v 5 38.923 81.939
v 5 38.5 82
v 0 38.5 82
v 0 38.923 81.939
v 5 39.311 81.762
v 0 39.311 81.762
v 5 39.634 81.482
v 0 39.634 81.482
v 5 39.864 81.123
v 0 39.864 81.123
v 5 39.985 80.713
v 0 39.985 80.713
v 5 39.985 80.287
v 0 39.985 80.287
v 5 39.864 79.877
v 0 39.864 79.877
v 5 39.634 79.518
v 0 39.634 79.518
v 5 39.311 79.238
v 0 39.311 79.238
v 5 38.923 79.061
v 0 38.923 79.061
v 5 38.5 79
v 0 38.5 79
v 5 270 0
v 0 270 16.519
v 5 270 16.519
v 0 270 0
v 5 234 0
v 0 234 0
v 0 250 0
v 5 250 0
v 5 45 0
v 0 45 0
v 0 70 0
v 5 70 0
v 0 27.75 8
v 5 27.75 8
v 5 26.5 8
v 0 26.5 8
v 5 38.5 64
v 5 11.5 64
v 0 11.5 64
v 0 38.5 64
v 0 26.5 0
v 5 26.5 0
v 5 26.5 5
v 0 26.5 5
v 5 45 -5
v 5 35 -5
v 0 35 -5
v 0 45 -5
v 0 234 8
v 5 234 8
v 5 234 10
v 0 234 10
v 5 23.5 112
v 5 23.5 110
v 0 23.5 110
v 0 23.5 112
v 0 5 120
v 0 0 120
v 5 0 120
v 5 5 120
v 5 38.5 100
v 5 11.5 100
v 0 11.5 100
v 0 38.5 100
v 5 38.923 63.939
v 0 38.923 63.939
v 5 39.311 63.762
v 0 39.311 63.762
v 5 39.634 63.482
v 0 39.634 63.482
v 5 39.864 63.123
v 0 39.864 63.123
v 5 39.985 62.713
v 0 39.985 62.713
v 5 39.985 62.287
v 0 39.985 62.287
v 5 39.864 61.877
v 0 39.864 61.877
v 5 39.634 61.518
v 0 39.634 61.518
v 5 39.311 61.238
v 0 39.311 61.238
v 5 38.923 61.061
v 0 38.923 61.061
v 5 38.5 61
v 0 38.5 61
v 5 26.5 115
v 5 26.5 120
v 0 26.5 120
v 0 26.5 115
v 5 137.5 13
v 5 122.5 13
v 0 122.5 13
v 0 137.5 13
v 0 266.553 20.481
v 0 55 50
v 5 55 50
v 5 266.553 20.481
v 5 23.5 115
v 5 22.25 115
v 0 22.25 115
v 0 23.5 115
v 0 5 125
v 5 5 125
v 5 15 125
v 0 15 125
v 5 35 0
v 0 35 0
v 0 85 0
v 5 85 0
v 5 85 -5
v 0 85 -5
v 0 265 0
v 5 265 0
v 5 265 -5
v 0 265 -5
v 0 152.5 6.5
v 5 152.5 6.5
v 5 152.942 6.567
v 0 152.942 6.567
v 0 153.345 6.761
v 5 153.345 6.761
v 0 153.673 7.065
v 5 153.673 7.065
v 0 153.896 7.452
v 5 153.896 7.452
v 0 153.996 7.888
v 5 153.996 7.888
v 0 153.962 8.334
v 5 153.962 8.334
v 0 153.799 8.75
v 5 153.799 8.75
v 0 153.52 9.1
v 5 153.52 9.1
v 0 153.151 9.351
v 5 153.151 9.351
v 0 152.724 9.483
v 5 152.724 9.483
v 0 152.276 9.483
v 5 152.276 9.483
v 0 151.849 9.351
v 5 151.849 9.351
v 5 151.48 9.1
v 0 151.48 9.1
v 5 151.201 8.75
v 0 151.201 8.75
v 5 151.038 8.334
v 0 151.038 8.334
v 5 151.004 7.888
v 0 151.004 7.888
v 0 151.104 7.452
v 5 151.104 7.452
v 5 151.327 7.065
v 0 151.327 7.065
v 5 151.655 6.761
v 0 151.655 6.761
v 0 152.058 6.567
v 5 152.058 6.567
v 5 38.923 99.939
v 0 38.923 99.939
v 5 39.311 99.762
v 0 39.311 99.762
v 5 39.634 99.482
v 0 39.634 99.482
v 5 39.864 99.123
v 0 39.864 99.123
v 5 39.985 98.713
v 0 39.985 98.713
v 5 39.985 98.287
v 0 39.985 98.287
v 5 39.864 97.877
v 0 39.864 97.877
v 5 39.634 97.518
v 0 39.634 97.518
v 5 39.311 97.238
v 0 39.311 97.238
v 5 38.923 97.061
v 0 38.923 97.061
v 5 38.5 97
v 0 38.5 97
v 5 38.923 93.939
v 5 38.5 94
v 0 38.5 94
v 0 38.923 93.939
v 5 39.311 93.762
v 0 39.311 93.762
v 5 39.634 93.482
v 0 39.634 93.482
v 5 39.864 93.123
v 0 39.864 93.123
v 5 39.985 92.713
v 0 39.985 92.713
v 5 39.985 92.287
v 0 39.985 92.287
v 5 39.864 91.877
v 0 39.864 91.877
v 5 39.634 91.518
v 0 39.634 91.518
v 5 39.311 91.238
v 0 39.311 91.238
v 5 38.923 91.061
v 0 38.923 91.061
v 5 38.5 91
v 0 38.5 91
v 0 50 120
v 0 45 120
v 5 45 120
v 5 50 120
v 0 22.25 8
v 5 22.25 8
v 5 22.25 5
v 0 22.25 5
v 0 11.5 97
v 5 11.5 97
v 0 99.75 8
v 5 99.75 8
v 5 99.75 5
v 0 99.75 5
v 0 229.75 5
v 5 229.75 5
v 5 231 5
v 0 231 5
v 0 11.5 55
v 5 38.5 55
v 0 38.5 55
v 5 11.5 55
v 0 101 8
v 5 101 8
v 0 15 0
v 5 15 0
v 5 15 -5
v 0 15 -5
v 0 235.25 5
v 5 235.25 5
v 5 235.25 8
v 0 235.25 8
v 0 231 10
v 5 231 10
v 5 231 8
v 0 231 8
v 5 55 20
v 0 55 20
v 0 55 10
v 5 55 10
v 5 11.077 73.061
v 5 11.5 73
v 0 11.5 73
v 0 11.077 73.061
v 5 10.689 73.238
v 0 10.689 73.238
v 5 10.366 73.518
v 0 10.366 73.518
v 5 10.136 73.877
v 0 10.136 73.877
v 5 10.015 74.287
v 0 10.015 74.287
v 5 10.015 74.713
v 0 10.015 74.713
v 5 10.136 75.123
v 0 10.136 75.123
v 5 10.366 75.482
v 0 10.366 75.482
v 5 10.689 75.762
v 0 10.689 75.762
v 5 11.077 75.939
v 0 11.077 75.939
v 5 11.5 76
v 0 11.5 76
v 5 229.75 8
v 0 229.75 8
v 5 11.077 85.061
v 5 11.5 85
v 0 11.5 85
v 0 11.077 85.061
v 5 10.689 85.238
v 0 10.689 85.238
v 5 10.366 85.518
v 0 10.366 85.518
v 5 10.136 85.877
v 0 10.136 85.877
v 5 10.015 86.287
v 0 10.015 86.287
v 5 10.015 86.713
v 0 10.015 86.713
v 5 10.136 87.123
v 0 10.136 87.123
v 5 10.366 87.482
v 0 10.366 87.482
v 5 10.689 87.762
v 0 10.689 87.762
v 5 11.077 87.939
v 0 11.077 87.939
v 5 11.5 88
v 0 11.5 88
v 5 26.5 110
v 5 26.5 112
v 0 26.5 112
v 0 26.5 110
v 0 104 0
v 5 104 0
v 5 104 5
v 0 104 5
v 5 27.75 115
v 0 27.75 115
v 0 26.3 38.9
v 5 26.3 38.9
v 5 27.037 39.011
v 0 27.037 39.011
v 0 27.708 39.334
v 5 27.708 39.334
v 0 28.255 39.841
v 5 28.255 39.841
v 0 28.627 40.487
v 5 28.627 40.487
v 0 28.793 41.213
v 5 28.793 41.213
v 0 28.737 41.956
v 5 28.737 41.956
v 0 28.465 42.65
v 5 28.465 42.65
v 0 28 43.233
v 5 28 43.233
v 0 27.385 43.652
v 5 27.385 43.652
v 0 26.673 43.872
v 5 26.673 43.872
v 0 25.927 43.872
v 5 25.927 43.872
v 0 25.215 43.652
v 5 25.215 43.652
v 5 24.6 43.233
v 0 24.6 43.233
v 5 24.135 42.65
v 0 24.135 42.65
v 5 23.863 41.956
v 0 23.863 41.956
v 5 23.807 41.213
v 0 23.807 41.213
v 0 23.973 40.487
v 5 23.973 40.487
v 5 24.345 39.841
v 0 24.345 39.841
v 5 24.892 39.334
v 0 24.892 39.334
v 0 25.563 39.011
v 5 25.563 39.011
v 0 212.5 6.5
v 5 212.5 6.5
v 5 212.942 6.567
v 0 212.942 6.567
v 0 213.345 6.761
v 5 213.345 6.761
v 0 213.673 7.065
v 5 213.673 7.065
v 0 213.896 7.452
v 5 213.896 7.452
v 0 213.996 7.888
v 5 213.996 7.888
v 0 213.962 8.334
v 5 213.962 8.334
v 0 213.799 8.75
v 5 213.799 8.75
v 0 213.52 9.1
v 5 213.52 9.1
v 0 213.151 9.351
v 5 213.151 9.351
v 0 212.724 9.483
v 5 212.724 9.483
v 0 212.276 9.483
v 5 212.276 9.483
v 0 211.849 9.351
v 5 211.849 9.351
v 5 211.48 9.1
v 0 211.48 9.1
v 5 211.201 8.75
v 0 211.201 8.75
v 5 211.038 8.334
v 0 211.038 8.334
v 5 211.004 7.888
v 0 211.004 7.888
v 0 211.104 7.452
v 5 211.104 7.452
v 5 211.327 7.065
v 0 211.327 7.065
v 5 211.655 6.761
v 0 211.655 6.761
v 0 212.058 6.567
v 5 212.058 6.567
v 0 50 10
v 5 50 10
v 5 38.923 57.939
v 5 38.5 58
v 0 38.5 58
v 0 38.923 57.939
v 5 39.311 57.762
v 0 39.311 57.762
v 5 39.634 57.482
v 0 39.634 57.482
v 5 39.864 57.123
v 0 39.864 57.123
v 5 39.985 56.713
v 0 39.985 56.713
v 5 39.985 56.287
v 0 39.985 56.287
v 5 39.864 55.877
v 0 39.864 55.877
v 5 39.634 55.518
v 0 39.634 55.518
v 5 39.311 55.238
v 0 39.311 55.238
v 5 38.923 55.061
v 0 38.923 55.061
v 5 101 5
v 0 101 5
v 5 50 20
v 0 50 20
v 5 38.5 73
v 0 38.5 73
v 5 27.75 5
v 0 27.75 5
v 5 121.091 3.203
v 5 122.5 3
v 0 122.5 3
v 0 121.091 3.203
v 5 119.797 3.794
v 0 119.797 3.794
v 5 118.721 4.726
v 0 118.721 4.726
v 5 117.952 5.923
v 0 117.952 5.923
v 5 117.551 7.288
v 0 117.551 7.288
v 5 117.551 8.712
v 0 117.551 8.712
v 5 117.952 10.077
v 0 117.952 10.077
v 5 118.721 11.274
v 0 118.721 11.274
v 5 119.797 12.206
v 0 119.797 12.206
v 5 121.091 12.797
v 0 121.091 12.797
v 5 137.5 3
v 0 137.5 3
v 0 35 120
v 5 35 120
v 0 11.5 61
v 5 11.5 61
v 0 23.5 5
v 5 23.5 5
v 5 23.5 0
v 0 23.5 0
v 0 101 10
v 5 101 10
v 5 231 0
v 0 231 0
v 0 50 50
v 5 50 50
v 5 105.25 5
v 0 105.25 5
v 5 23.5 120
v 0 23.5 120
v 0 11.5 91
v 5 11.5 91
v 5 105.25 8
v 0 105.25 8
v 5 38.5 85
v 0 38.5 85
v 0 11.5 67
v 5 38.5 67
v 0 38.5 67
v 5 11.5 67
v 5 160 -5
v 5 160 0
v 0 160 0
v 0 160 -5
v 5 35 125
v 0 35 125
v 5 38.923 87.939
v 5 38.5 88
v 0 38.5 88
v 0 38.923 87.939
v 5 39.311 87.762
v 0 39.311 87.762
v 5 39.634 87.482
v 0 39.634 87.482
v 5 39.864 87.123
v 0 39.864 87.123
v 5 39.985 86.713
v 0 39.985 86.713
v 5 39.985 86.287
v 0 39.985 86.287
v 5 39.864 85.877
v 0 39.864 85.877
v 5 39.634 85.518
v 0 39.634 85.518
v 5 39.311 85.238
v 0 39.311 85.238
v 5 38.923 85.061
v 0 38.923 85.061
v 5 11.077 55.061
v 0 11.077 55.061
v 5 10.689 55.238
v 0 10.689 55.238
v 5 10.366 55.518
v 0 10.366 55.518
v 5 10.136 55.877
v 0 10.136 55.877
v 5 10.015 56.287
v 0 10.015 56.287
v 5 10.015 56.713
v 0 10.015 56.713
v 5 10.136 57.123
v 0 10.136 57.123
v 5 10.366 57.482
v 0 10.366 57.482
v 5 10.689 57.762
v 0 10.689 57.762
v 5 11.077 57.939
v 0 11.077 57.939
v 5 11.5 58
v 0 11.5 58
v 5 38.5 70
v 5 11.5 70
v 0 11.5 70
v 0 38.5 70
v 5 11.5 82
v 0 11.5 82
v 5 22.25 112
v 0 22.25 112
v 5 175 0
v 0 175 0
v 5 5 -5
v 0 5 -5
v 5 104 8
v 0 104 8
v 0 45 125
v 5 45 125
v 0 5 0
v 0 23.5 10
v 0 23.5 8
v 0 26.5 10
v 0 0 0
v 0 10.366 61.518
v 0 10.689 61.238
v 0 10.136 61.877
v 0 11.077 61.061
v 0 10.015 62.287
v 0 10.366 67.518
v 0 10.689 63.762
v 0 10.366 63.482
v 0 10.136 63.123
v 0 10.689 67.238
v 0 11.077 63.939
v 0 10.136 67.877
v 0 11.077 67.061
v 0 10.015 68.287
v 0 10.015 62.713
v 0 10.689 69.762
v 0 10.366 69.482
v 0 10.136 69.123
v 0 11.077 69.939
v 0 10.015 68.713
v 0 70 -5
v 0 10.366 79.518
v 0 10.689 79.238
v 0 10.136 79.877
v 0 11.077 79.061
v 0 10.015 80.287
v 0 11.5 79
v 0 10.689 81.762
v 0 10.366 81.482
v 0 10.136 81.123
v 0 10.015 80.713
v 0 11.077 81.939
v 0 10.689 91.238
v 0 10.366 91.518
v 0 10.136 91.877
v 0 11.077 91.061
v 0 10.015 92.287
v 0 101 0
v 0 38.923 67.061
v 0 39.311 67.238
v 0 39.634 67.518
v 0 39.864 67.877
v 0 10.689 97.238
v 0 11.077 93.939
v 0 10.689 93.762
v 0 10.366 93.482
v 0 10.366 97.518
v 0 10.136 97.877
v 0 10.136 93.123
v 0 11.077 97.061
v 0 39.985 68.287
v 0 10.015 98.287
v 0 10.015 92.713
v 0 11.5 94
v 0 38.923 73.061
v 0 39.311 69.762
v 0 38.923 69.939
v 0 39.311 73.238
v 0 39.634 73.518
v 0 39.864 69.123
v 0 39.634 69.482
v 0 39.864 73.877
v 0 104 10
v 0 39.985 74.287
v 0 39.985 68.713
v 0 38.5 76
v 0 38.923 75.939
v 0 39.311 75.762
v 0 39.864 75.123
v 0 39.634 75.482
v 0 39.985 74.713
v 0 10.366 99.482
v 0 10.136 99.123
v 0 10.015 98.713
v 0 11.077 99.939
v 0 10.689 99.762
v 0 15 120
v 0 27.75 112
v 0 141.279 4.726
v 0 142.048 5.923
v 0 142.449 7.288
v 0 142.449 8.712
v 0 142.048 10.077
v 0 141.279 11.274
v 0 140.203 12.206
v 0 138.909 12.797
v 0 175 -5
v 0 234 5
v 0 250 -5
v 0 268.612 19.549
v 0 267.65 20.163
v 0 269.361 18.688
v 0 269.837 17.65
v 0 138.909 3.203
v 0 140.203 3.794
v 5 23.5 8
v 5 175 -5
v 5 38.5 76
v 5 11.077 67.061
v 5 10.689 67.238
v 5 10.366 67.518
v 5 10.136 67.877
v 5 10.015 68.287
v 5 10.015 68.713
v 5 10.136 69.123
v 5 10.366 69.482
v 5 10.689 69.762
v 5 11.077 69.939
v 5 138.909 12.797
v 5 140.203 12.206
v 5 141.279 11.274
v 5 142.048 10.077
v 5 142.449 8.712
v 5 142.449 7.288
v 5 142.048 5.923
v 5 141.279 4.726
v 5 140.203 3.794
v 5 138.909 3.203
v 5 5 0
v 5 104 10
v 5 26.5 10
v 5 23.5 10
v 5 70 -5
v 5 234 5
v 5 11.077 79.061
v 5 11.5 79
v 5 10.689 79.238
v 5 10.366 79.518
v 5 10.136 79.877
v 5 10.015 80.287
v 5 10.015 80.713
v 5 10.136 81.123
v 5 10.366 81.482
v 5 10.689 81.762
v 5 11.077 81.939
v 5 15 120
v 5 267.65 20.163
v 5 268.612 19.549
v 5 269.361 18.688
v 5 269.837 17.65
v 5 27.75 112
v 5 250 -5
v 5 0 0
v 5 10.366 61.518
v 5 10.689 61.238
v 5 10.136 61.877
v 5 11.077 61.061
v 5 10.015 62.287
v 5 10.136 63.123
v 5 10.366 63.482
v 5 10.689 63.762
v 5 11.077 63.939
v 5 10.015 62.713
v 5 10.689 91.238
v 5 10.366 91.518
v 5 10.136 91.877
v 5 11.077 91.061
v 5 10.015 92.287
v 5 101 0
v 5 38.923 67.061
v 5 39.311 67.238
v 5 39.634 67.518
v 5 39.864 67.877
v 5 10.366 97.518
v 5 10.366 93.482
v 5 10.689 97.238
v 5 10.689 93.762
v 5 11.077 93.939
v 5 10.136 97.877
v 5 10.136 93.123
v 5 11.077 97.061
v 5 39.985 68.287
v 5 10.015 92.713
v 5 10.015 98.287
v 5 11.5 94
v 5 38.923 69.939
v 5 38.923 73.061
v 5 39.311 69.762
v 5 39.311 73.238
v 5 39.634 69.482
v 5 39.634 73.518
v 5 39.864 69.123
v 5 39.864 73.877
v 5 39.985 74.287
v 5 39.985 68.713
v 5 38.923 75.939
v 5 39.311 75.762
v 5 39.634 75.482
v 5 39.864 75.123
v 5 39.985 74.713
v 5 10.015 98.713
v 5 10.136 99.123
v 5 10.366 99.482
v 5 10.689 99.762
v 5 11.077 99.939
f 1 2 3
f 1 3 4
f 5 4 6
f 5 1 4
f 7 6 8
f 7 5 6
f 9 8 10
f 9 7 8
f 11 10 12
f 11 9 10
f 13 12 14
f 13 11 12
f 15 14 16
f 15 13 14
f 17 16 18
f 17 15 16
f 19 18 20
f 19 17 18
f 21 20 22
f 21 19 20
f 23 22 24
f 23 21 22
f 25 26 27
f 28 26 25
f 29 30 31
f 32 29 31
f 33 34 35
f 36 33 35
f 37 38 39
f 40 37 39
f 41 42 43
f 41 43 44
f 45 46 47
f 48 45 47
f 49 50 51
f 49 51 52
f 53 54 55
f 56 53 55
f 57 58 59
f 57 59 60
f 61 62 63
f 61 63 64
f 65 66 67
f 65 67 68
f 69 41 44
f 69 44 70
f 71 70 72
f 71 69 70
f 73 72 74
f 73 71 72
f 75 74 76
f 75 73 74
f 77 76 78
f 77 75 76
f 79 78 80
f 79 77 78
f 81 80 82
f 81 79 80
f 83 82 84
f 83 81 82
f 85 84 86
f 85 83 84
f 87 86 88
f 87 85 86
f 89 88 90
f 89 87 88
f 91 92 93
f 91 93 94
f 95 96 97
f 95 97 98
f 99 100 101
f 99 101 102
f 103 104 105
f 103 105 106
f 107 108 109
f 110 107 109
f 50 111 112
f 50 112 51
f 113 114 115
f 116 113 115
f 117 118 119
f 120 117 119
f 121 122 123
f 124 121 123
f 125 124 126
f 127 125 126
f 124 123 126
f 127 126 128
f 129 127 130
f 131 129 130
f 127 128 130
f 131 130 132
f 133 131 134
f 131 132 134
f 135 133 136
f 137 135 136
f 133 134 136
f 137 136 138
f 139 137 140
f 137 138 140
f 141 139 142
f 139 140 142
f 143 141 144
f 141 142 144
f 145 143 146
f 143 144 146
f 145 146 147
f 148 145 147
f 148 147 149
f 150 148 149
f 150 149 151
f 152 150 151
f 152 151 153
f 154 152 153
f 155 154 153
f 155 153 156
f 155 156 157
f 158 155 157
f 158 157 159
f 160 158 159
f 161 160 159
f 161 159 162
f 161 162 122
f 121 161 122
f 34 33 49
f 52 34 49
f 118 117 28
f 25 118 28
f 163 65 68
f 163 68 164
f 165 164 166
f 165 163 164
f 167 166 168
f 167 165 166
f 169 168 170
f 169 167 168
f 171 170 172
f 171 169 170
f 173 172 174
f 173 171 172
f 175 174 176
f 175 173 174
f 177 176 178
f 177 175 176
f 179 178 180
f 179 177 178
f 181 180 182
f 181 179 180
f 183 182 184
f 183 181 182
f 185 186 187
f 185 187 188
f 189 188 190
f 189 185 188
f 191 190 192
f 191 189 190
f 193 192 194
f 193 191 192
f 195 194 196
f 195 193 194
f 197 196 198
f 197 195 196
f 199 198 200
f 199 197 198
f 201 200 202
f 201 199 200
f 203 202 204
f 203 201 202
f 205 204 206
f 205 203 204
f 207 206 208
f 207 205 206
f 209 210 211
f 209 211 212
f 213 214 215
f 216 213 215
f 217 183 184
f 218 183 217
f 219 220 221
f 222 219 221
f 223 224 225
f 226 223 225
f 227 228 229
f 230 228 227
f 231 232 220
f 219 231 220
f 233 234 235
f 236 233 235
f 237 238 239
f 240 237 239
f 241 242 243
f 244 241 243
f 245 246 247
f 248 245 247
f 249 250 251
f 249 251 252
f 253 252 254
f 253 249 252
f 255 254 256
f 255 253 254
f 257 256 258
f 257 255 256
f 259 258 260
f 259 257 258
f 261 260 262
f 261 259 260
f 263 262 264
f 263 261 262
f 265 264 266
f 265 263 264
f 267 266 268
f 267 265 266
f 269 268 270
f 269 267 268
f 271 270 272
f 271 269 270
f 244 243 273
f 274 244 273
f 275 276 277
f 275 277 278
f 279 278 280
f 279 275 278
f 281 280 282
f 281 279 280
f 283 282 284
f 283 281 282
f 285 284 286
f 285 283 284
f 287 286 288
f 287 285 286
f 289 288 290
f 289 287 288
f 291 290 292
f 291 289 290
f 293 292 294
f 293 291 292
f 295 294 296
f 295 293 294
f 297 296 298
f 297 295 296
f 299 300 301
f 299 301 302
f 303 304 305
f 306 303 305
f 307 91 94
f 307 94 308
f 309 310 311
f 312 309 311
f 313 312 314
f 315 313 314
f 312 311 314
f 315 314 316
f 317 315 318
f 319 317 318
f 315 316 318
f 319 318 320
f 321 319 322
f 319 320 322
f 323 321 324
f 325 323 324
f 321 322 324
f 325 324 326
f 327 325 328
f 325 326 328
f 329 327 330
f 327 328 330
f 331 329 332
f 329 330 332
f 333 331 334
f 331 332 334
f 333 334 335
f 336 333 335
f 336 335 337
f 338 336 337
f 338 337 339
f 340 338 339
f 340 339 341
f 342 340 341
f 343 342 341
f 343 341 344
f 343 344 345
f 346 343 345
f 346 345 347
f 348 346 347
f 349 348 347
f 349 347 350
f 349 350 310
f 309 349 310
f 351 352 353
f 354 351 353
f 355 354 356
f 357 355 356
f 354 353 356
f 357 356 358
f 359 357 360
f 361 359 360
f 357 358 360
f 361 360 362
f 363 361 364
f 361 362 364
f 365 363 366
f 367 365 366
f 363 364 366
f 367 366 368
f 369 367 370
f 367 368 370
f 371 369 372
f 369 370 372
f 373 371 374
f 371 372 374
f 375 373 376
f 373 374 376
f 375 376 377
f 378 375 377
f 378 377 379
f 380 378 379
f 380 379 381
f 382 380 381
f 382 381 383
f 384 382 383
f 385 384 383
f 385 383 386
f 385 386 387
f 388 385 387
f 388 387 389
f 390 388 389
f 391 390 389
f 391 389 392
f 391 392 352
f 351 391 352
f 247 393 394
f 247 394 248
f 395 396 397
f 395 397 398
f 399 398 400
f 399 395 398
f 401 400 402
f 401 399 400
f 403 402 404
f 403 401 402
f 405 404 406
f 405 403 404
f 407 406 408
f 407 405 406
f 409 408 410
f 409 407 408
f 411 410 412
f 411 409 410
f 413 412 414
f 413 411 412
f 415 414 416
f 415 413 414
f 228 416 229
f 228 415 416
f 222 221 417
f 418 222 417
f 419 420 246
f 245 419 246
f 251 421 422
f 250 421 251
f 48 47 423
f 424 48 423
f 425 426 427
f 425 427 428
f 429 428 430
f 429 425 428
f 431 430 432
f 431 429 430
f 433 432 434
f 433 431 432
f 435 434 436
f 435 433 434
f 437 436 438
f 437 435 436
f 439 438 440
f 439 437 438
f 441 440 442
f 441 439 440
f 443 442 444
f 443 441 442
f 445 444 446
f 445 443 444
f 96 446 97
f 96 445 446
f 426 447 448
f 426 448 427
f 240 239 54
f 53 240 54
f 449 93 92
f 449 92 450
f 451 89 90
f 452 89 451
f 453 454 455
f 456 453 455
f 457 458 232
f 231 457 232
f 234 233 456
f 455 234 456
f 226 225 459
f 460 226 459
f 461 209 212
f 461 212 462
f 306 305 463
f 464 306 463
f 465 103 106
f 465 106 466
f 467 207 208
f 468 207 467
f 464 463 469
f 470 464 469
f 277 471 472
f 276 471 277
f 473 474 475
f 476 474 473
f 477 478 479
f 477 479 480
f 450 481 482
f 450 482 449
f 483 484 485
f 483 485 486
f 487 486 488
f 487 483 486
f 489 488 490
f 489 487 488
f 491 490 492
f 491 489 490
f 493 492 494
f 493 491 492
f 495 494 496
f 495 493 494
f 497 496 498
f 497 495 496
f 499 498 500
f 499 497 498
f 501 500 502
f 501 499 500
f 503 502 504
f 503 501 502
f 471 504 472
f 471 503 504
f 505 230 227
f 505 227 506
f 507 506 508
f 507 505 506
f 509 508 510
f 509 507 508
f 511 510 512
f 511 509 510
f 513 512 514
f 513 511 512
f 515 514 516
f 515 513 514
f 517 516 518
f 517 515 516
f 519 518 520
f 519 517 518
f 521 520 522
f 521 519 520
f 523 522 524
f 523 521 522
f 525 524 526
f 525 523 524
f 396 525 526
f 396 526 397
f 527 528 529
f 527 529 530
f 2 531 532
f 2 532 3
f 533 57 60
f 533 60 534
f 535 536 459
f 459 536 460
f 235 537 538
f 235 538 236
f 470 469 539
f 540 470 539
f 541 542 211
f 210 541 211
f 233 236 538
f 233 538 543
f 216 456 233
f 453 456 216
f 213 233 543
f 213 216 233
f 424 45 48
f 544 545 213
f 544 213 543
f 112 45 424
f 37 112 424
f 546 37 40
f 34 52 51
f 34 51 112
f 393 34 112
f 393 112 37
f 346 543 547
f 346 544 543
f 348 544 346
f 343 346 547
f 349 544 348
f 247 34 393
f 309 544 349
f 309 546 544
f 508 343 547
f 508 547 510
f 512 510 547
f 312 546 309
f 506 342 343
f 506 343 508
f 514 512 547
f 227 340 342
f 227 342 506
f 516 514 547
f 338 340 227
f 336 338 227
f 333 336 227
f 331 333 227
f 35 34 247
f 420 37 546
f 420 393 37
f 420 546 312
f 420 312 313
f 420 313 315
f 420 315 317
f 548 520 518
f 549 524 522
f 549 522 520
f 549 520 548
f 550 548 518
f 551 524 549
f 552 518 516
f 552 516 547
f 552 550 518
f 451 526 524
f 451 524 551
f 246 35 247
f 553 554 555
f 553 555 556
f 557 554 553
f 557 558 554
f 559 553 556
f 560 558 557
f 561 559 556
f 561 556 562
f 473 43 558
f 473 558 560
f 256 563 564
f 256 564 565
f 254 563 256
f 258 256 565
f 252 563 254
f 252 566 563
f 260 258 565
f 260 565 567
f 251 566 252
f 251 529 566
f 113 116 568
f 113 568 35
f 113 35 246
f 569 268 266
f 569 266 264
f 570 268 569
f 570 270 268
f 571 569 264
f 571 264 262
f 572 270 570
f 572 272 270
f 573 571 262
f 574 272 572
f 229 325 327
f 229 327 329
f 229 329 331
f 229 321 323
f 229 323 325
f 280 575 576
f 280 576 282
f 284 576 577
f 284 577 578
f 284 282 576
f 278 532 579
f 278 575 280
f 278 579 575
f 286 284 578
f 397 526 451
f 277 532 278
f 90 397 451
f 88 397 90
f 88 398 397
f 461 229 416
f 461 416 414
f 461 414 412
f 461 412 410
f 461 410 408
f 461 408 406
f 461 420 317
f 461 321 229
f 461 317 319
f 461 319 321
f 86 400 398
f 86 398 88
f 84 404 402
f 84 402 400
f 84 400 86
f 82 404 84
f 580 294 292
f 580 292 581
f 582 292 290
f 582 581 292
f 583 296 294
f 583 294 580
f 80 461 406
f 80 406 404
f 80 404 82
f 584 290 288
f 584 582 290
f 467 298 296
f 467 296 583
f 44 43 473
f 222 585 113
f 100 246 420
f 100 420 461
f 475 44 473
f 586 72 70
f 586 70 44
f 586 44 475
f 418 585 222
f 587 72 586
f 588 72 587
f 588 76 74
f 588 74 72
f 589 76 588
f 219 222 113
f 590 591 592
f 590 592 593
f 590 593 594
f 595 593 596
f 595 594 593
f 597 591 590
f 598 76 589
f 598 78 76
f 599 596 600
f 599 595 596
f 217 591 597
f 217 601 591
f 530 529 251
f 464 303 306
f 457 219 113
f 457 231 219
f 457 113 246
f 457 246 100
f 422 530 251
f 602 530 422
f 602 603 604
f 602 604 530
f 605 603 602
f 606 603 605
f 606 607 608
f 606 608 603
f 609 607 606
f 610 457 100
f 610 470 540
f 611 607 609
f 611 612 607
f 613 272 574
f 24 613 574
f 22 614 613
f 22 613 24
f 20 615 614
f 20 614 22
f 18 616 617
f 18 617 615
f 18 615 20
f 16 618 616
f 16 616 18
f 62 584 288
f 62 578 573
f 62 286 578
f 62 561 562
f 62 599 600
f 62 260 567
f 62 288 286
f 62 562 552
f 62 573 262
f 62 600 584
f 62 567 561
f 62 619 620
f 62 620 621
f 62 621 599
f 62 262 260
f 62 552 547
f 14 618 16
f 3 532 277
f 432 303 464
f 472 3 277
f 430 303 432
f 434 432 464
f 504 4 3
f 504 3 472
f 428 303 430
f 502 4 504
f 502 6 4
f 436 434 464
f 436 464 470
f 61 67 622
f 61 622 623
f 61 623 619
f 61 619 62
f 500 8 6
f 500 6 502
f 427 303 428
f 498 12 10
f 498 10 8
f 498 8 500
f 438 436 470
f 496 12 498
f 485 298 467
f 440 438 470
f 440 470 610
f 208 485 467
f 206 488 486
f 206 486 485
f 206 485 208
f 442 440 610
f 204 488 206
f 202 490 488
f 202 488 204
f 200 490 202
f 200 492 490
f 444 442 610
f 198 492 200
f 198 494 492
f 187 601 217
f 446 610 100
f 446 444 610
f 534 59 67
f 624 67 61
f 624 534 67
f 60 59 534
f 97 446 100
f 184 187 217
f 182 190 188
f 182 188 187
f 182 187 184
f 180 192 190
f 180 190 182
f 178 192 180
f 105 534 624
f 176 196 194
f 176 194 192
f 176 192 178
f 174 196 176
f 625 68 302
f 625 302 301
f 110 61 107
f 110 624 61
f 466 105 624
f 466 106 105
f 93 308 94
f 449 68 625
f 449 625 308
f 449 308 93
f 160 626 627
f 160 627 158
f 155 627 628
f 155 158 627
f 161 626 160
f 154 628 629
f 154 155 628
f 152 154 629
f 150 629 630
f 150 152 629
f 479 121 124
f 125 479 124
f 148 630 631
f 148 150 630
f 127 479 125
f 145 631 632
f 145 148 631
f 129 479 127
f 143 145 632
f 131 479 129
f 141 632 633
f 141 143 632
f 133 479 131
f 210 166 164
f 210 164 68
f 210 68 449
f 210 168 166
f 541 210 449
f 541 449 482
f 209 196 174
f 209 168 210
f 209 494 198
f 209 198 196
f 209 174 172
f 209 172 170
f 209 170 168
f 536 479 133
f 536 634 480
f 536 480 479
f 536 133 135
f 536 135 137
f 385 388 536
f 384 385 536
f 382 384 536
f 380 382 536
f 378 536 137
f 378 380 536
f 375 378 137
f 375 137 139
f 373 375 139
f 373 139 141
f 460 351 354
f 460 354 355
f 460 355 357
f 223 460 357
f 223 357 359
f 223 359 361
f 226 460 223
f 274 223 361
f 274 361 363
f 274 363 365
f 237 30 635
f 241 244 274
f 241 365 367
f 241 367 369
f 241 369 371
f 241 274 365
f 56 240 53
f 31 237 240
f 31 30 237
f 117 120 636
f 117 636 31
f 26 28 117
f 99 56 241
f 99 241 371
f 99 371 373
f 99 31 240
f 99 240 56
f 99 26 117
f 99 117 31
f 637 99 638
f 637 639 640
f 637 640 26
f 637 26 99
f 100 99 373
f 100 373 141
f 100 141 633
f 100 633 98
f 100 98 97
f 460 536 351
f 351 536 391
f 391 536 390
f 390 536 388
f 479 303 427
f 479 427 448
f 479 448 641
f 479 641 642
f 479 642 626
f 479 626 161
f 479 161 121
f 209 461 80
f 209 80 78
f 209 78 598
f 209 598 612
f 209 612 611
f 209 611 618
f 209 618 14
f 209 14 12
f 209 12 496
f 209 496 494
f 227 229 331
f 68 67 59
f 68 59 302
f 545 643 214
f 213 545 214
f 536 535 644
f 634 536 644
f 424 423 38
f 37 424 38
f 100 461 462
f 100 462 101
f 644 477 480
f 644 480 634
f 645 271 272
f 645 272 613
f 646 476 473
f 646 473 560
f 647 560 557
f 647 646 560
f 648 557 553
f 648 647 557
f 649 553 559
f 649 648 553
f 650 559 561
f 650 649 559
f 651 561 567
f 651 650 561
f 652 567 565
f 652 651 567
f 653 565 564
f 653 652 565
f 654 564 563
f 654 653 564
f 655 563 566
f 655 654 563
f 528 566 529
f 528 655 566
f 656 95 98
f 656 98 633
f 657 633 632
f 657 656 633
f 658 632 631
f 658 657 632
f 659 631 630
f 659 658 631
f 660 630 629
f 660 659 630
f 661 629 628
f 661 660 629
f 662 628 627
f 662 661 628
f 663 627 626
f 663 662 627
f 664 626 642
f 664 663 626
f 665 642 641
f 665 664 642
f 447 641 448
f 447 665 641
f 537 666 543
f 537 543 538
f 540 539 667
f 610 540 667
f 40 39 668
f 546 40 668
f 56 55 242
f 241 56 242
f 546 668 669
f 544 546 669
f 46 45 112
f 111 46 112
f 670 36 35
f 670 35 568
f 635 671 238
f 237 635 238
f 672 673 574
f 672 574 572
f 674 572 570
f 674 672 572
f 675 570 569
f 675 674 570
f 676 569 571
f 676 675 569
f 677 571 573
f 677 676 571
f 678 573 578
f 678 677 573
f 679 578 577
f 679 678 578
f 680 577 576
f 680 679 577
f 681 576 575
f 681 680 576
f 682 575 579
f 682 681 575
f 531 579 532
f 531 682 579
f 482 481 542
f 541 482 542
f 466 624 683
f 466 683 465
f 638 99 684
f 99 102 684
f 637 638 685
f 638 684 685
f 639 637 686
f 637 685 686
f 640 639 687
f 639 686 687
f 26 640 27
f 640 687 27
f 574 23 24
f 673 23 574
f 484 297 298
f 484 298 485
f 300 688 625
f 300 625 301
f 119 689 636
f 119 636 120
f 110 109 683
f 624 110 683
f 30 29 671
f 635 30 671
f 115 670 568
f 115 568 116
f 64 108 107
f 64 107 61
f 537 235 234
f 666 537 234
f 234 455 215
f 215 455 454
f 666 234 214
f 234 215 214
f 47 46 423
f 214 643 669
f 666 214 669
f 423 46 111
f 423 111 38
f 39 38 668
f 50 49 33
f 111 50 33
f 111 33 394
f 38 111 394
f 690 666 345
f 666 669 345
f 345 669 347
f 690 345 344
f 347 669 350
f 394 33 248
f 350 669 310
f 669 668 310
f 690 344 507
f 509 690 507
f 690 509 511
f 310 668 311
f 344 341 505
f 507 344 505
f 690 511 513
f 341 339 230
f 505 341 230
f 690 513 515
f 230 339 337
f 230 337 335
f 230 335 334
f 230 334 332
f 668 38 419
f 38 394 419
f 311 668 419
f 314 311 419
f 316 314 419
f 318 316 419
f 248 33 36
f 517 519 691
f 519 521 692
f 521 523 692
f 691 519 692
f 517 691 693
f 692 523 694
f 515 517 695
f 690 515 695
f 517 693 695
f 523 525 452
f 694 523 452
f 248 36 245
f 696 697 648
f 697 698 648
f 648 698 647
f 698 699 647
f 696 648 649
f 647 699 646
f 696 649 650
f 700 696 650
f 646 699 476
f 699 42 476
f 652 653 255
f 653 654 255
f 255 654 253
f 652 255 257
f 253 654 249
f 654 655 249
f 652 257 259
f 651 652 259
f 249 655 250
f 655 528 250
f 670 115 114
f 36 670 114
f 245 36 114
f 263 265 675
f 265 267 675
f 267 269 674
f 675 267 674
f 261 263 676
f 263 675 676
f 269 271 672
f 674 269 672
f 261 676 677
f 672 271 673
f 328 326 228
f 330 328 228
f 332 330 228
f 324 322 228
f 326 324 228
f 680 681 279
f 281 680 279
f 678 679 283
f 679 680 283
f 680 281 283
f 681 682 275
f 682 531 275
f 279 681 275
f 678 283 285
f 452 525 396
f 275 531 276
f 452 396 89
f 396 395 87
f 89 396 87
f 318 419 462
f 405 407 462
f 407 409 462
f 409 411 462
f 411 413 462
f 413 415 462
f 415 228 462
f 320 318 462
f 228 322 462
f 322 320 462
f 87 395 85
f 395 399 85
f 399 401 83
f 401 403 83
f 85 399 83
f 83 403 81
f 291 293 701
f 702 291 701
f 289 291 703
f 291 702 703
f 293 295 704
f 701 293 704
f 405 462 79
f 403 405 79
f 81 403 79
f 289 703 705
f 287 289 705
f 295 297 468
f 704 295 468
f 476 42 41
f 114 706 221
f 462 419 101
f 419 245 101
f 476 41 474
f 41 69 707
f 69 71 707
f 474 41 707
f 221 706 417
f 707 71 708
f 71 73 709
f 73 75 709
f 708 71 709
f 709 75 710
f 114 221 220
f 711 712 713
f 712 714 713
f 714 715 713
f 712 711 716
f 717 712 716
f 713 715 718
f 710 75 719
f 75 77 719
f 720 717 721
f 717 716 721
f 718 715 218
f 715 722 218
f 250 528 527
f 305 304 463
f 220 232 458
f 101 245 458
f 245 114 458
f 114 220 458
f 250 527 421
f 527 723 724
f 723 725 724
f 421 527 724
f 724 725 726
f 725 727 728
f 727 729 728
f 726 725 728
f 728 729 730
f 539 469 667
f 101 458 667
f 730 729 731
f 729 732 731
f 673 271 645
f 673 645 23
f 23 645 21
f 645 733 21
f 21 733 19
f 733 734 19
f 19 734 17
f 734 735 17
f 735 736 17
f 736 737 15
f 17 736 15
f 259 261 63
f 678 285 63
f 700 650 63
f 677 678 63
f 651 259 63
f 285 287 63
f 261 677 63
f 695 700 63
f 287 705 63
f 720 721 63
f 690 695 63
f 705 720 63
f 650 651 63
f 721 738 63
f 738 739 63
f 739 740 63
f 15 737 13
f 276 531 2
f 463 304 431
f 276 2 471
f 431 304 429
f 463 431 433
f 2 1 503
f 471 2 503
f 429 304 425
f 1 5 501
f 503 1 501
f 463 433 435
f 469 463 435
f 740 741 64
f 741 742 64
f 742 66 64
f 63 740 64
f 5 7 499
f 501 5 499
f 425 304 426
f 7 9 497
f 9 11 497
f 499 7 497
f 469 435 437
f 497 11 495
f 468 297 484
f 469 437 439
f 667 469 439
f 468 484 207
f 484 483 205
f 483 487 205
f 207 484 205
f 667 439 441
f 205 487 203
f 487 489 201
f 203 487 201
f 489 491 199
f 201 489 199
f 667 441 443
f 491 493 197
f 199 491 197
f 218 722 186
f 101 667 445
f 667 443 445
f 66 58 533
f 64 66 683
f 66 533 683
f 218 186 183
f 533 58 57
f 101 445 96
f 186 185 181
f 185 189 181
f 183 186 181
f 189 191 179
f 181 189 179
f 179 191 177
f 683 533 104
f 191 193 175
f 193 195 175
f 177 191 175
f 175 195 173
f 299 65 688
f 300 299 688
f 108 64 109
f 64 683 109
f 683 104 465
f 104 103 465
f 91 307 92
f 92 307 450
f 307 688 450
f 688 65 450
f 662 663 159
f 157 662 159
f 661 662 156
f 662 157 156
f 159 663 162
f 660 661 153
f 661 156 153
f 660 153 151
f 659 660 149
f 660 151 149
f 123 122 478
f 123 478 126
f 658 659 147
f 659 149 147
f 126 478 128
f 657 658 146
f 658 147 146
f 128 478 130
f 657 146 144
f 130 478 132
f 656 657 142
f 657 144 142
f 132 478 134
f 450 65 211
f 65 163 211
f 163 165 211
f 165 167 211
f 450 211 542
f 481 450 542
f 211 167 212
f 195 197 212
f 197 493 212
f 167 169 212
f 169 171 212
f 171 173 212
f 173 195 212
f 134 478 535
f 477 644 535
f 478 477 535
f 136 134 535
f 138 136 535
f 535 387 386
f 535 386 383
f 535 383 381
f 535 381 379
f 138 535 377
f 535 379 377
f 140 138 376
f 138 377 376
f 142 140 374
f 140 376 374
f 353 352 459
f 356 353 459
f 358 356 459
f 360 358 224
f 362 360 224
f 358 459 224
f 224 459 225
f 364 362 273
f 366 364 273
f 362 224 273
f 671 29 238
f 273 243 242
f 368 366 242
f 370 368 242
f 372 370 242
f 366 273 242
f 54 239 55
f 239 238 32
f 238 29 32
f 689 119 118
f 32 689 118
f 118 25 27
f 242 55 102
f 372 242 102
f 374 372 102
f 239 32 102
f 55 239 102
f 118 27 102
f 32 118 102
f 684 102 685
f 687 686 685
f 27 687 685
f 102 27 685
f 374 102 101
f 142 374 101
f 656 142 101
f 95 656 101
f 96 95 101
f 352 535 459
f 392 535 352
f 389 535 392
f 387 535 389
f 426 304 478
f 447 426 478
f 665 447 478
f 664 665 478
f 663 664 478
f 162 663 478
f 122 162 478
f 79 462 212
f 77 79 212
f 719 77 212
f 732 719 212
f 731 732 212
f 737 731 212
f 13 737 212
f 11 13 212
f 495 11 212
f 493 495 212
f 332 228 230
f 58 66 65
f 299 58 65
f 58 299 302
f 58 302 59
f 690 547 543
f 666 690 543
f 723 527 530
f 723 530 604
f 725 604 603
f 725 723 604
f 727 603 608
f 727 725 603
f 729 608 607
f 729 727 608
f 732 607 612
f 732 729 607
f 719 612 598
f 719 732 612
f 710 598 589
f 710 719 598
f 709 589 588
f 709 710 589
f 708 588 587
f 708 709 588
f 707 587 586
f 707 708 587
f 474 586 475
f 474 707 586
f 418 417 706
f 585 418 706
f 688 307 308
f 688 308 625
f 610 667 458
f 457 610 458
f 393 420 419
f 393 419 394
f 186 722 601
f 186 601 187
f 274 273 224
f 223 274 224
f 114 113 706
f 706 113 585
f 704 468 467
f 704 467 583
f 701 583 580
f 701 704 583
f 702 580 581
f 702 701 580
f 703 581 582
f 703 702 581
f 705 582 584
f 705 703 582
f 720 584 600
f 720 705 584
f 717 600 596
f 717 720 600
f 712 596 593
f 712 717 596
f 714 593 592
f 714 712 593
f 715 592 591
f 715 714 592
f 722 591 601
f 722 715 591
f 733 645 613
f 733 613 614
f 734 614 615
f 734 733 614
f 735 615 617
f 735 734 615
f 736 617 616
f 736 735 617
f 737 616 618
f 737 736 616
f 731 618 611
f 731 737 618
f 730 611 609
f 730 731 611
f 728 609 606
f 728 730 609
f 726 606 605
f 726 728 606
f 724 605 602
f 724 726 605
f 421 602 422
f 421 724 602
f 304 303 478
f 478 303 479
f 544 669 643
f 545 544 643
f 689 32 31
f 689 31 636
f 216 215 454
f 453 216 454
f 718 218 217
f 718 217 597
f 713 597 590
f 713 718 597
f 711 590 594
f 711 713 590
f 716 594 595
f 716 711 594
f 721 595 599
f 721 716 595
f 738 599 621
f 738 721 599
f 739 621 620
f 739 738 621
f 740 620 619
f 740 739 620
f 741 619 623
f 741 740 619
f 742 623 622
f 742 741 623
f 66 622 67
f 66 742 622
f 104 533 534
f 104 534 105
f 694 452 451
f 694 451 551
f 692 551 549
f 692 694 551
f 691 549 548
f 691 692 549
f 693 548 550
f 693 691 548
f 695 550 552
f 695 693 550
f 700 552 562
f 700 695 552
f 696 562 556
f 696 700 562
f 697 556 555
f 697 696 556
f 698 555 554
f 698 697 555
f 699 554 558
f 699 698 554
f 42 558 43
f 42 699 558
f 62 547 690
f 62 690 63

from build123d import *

# Parameters (mm, degrees)
SKETCH1_W           = 10
SKETCH1_H           = 5
BOSS_EXTRUDE1_DEPTH = 5
SKETCH2_W           = 5
SKETCH2_H           = 10
SKETCH2_H_2         = 15
BOSS_EXTRUDE2_DEPTH = 5
SKETCH3_R           = 2.5
SKETCH3_R_2         = 1.5
CUT_EXTRUDE1_DEPTH  = 298.573520327
CUT_EXTRUDE2_DEPTH  = 298.573520327
FILLET1_R           = 4


with BuildPart() as part:
    # Sketch1 → Boss-Extrude1 (new body)
    with BuildSketch(Plane(origin=(0, 0, 0), x_dir=(0, 0, -1), z_dir=(1, 0, 0))):
        Polygon((-50, 50), (-50, 55), (-20, 270), (0, 270), (0, 55), (0, 50), (0, 0), (-120, 0), (-120, 50), align=None)
        with Locations((-15, 52.5)):
            Rectangle(SKETCH1_W, SKETCH1_H, mode=Mode.SUBTRACT)
    extrude(amount=BOSS_EXTRUDE1_DEPTH)

    # Sketch2 → Boss-Extrude2 (add)
    with BuildSketch(Plane(origin=(5, 0, 0), x_dir=(0, 0, -1), z_dir=(1, 0, 0))):
        with Locations((-122.5, 10)):
            Rectangle(SKETCH2_W, SKETCH2_H)
        with Locations((-122.5, 40)):
            Rectangle(SKETCH2_W, SKETCH2_H)
        with Locations((2.5, 257.5)):
            Rectangle(SKETCH2_W, SKETCH2_H_2)
        with Locations((2.5, 77.5)):
            Rectangle(SKETCH2_W, SKETCH2_H_2)
        with Locations((2.5, 40)):
            Rectangle(SKETCH2_W, SKETCH2_H)
        with Locations((2.5, 10)):
            Rectangle(SKETCH2_W, SKETCH2_H)
        with Locations((2.5, 167.5)):
            Rectangle(SKETCH2_W, SKETCH2_H_2)
    extrude(amount=-BOSS_EXTRUDE2_DEPTH)

    # Sketch3 → Cut-Extrude1 (cut, through all)
    with BuildSketch(Plane(origin=(5, 0, 0), x_dir=(0, 0, -1), z_dir=(1, 0, 0))):
        with Locations((-41.4, 26.3)):
            Circle(SKETCH3_R)
        with Locations((-8, 212.5)):
            Circle(SKETCH3_R_2)
        with Locations((-8, 152.5)):
            Circle(SKETCH3_R_2)
        Polygon((0, 26.5), (-5, 26.5), (-5, 27.75), (-8, 27.75), (-8, 26.5), (-10, 26.5), (-10, 23.5), (-8, 23.5), (-8, 22.25), (-5, 22.25), (-5, 23.5), (0, 23.5), align=None)
        Polygon((0, 104), (-5, 104), (-5, 105.25), (-8, 105.25), (-8, 104), (-10, 104), (-10, 101), (-8, 101), (-8, 99.75), (-5, 99.75), (-5, 101), (0, 101), align=None)
        Polygon((0, 234), (-5, 234), (-5, 235.25), (-8, 235.25), (-8, 234), (-10, 234), (-10, 231), (-8, 231), (-8, 229.75), (-5, 229.75), (-5, 231), (0, 231), align=None)
        Polygon((-120, 23.5), (-120, 26.5), (-115, 26.5), (-115, 27.75), (-112, 27.75), (-112, 26.5), (-110, 26.5), (-110, 23.5), (-112, 23.5), (-112, 22.25), (-115, 22.25), (-115, 23.5), align=None)
        with BuildLine():
            Line((-3, 137.5), (-3, 122.5))
            ThreePointArc((-3, 122.5), (-8, 117.5), (-13, 122.5))
            Line((-13, 122.5), (-13, 137.5))
            ThreePointArc((-13, 137.5), (-8, 142.5), (-3, 137.5))
        make_face()
    extrude(amount=-CUT_EXTRUDE1_DEPTH, mode=Mode.SUBTRACT)

    # Sketch4 → Cut-Extrude2 (cut, through all)
    with BuildSketch(Plane(origin=(5, 0, 0), x_dir=(0, 0, -1), z_dir=(1, 0, 0))):
        with BuildLine():
            Line((-97, 38.5), (-97, 11.5))
            ThreePointArc((-97, 11.5), (-98.5, 10), (-100, 11.5))
            Line((-100, 11.5), (-100, 38.5))
            ThreePointArc((-100, 38.5), (-98.5, 40), (-97, 38.5))
        make_face()
        with BuildLine():
            Line((-91, 38.5), (-91, 11.5))
            ThreePointArc((-91, 11.5), (-92.5, 10), (-94, 11.5))
            Line((-94, 11.5), (-94, 38.5))
            ThreePointArc((-94, 38.5), (-92.5, 40), (-91, 38.5))
        make_face()
        with BuildLine():
            Line((-85, 38.5), (-85, 11.5))
            ThreePointArc((-85, 11.5), (-86.5, 10), (-88, 11.5))
            Line((-88, 11.5), (-88, 38.5))
            ThreePointArc((-88, 38.5), (-86.5, 40), (-85, 38.5))
        make_face()
        with BuildLine():
            Line((-79, 38.5), (-79, 11.5))
            ThreePointArc((-79, 11.5), (-80.5, 10), (-82, 11.5))
            Line((-82, 11.5), (-82, 38.5))
            ThreePointArc((-82, 38.5), (-80.5, 40), (-79, 38.5))
        make_face()
        with BuildLine():
            Line((-73, 38.5), (-73, 11.5))
            ThreePointArc((-73, 11.5), (-74.5, 10), (-76, 11.5))
            Line((-76, 11.5), (-76, 38.5))
            ThreePointArc((-76, 38.5), (-74.5, 40), (-73, 38.5))
        make_face()
        with BuildLine():
            Line((-67, 38.5), (-67, 11.5))
            ThreePointArc((-67, 11.5), (-68.5, 10), (-70, 11.5))
            Line((-70, 11.5), (-70, 38.5))
            ThreePointArc((-70, 38.5), (-68.5, 40), (-67, 38.5))
        make_face()
        with BuildLine():
            Line((-61, 38.5), (-61, 11.5))
            ThreePointArc((-61, 11.5), (-62.5, 10), (-64, 11.5))
            Line((-64, 11.5), (-64, 38.5))
            ThreePointArc((-64, 38.5), (-62.5, 40), (-61, 38.5))
        make_face()
        with BuildLine():
            Line((-55, 38.5), (-55, 11.5))
            ThreePointArc((-55, 11.5), (-56.5, 10), (-58, 11.5))
            Line((-58, 11.5), (-58, 38.5))
            ThreePointArc((-58, 38.5), (-56.5, 40), (-55, 38.5))
        make_face()
    extrude(amount=-CUT_EXTRUDE2_DEPTH, mode=Mode.SUBTRACT)

    # Fillet1
    fillet1_edges = [part.edges().sort_by_distance(p)[0] for p in [
        (2.5, 270, 20),
    ]]
    fillet(fillet1_edges, radius=FILLET1_R)


solid = part.part
